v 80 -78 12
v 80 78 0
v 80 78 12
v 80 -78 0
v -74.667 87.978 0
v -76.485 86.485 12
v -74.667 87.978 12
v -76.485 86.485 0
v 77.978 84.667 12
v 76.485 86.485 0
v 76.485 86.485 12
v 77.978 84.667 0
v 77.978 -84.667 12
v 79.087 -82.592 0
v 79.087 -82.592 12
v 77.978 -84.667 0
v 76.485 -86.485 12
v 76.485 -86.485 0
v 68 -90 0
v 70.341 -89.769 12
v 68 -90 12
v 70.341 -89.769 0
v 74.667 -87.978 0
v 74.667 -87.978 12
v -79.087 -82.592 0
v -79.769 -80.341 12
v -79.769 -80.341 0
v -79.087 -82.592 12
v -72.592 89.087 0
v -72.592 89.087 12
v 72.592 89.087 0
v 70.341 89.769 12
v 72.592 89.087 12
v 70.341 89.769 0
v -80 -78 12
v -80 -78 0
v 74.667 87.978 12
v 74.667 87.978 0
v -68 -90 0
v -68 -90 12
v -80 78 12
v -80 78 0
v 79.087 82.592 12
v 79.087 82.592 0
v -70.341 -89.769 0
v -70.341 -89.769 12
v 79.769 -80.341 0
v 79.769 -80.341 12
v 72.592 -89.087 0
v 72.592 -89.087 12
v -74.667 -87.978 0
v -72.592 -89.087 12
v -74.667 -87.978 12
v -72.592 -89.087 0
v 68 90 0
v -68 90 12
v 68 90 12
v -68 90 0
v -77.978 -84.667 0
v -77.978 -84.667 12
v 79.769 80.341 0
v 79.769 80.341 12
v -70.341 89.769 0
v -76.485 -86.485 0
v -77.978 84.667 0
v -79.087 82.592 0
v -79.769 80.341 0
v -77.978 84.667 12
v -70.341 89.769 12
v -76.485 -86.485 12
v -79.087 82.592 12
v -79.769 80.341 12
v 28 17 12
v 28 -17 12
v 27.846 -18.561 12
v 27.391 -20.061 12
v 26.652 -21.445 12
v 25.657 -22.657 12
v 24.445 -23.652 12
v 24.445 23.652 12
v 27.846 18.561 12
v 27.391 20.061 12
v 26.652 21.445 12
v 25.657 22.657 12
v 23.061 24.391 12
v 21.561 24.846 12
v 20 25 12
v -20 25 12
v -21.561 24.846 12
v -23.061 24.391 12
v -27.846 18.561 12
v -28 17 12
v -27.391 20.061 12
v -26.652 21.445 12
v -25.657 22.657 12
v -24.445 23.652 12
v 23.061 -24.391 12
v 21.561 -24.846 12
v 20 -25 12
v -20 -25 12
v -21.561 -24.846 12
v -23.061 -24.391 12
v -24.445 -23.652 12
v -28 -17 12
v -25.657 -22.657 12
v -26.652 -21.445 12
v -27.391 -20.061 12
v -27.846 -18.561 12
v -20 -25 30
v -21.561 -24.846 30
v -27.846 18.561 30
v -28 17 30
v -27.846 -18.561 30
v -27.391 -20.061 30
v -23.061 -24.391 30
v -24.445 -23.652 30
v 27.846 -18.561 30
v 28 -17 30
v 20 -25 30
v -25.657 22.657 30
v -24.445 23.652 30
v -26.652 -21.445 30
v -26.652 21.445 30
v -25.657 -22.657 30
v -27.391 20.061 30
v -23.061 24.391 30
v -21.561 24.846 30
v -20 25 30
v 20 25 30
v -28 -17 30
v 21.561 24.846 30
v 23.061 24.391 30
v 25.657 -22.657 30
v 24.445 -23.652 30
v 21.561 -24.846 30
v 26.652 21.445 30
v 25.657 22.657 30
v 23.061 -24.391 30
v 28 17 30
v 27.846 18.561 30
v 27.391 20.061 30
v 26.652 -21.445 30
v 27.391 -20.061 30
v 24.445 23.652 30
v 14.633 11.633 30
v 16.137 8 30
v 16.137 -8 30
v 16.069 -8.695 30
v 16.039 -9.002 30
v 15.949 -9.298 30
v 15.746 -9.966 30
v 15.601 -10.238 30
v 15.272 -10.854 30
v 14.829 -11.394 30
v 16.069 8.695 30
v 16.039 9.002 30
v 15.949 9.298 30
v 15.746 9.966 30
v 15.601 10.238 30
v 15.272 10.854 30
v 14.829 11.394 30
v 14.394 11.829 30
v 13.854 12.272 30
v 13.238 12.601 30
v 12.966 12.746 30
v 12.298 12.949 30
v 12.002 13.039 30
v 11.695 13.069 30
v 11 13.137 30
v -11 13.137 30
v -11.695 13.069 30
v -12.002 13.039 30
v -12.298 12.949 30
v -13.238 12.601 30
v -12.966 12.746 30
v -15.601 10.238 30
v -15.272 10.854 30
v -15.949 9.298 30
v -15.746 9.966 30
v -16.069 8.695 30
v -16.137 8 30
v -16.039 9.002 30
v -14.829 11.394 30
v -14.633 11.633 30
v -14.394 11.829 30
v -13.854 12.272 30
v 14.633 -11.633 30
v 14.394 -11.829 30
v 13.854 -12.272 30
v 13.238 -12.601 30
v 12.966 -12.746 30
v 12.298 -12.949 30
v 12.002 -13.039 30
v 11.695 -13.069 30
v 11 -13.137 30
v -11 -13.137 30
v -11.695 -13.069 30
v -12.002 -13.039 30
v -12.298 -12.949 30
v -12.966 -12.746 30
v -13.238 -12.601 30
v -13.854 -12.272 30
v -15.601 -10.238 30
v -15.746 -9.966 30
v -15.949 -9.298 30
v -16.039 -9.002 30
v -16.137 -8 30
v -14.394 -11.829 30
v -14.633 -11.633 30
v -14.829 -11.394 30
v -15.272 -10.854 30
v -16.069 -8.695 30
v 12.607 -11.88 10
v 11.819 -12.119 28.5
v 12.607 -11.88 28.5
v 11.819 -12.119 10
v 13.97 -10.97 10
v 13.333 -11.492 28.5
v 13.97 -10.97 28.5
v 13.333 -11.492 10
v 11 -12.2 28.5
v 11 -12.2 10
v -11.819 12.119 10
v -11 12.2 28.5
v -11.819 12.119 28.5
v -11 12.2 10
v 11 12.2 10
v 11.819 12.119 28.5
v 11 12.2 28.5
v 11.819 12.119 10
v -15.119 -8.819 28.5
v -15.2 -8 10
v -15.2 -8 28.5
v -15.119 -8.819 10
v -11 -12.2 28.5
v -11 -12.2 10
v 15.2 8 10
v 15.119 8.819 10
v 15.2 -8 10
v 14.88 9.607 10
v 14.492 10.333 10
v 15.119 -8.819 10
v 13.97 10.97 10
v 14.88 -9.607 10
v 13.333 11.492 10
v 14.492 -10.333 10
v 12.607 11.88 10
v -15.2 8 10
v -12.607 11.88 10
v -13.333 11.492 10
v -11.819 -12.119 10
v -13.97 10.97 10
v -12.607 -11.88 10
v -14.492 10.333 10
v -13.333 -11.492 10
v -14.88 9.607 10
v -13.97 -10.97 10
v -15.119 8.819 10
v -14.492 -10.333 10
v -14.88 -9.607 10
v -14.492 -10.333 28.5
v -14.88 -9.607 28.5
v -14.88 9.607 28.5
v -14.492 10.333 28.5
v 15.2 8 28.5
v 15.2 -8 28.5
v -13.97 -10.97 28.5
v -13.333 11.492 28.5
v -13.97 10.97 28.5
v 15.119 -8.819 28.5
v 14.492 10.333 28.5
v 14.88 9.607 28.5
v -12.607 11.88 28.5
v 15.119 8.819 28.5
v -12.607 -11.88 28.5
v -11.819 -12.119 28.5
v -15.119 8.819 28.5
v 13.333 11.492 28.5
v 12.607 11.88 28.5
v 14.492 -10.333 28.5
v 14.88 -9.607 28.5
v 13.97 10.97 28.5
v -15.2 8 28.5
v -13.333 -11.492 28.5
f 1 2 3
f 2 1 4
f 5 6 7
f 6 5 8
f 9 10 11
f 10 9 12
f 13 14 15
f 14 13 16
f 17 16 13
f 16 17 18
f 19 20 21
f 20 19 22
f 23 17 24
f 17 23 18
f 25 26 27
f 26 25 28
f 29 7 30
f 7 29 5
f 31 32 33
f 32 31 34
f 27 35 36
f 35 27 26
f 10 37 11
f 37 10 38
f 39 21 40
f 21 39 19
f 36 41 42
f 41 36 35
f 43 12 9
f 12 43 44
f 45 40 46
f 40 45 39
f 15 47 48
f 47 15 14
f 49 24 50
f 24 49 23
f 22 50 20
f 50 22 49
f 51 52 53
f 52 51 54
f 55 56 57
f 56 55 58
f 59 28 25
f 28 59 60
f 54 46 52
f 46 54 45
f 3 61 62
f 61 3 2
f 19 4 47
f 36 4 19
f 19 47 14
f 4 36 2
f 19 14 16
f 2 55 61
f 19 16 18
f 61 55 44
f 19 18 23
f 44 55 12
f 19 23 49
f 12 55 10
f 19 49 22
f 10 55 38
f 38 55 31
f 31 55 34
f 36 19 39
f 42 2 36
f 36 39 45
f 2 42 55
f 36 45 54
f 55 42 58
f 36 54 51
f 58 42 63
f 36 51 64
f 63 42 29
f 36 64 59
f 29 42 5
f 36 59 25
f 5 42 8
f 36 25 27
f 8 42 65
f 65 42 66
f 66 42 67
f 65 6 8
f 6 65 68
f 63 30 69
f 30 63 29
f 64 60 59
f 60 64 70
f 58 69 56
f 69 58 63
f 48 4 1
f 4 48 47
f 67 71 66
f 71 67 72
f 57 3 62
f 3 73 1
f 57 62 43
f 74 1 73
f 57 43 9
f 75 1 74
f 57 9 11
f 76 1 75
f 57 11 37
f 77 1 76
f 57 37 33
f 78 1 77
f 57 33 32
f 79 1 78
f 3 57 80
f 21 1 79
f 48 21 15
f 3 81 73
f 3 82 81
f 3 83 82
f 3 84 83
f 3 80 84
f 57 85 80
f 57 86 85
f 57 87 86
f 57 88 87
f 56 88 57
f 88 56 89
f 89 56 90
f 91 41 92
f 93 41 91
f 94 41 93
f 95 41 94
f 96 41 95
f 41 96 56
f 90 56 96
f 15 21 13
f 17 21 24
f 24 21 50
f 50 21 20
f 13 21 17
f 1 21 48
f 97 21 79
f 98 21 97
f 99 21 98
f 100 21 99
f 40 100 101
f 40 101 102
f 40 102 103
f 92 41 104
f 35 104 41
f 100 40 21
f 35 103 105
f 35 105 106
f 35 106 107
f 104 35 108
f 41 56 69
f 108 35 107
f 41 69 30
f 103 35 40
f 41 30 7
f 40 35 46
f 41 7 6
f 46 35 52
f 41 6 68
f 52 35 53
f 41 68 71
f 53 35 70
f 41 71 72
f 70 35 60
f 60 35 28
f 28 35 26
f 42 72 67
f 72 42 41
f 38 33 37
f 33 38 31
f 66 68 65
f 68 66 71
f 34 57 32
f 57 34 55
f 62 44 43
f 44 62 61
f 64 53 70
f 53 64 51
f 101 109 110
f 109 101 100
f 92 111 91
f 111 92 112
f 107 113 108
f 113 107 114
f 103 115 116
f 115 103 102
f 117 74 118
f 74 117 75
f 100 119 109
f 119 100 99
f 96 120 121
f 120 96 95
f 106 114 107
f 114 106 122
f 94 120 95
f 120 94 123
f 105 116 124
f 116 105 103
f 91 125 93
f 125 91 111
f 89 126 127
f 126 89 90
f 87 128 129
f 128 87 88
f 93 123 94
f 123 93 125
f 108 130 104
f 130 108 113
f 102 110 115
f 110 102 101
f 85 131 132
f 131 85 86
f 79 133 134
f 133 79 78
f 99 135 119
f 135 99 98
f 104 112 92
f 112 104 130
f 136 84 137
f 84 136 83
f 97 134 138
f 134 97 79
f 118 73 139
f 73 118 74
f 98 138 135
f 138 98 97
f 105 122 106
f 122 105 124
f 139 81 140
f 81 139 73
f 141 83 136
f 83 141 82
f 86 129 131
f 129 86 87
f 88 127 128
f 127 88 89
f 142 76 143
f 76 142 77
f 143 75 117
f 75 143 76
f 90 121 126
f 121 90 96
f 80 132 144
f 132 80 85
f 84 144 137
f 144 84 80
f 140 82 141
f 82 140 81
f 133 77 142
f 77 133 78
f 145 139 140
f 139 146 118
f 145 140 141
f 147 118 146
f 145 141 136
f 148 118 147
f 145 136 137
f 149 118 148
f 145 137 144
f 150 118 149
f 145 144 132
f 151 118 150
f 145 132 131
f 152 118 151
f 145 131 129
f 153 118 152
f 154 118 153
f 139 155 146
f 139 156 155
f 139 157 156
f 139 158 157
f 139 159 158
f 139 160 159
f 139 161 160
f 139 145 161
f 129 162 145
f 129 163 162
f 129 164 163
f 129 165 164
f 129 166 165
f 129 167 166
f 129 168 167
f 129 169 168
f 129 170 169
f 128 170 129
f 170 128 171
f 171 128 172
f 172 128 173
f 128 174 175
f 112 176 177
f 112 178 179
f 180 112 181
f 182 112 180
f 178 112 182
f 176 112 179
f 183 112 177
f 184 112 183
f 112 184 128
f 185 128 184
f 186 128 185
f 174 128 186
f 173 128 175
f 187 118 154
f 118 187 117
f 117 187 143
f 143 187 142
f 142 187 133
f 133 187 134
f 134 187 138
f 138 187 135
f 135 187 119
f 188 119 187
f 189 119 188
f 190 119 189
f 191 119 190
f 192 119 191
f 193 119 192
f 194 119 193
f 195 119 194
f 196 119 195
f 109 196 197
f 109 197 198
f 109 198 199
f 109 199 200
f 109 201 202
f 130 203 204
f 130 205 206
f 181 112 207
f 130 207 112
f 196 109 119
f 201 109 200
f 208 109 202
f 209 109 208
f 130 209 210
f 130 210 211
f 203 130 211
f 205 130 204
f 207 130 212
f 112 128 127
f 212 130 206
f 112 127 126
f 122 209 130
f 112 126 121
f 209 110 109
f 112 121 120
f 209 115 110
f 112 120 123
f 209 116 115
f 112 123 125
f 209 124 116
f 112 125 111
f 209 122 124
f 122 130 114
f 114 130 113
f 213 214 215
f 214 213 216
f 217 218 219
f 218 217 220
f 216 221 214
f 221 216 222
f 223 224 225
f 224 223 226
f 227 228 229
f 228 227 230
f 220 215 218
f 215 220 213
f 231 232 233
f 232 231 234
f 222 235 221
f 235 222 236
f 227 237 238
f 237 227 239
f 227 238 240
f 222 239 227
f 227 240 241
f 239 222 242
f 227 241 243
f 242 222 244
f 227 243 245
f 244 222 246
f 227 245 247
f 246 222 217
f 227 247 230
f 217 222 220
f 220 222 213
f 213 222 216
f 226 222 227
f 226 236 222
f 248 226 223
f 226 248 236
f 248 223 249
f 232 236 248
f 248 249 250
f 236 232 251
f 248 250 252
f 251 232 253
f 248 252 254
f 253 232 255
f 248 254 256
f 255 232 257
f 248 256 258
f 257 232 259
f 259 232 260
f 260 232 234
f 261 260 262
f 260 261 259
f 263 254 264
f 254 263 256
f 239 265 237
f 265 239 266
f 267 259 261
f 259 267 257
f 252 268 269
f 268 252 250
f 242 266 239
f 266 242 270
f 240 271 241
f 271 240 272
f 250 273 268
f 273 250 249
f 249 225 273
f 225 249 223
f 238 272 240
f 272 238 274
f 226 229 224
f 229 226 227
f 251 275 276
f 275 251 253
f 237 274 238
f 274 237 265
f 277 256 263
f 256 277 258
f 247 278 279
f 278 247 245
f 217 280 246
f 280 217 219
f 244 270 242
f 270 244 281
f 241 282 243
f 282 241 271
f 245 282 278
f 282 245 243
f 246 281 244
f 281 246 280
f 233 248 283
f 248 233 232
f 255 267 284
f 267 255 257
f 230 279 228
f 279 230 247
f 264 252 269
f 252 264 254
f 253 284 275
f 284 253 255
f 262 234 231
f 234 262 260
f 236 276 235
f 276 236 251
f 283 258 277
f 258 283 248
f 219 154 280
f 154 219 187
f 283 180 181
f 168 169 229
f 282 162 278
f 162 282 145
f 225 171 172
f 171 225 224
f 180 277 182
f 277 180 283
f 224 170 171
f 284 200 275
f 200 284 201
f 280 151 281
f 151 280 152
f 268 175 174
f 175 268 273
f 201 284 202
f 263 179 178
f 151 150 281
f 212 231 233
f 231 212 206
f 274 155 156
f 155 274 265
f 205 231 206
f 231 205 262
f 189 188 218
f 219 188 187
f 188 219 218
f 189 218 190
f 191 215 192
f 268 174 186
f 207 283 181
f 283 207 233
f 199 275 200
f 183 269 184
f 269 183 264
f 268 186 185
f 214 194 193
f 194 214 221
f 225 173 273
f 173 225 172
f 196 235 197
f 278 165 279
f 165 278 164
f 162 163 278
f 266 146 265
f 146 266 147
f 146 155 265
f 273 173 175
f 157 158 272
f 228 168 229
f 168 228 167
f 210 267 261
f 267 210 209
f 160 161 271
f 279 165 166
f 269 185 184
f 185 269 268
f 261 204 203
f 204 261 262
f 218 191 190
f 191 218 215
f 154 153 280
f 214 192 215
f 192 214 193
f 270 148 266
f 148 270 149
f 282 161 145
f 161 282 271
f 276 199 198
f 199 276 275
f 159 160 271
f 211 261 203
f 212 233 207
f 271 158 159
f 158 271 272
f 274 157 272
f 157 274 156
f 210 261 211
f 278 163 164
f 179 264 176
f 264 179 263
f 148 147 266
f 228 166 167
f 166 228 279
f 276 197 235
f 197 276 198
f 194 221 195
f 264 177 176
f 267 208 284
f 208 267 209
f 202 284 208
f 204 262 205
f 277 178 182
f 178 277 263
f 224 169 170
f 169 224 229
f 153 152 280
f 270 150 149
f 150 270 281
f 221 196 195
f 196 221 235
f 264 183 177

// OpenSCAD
// Headphone stand in three parts - PLA, no supports, 0.4mm nozzle
// Print orientations (+Z up, bottom on bed):
//   base   : flat, plate bottom on bed
//   post   : vertical, bottom on bed (250+ tall)
//   hanger : flat bottom on bed, curved top up, socket opening down (bridged)
// Assembly (desk Z=0): base 0-30, post 10-262, hanger 244-270 (top ~270)

part = "base"; // [base:Base, post:Post, hanger:Hanger, assembly:Assembly]
cadverify_only = "";
module instance(name, part, unit = 1) {
    echo(cadverify_instance = [name, part, unit]);
    if (cadverify_only == "" || cadverify_only == name) children();
}

// ---------- parameters ----------
baseW = 160; baseD = 180; baseT = 12; baseR = 12;
bossW = 56; bossD = 50; bossH = 18; bossR = 8;
bossTop = baseT + bossH; // 30
sockW = 30.4; sockD = 24.4; sockR = 4.2; // base socket (post 30x24 +0.4)
sockDepthBase = 20;
sockFloorBase = bossTop - sockDepthBase; // 10
flare = 1.5;
mouthWBase = sockW + 2*flare; mouthDBase = sockD + 2*flare; mouthRBase = sockR + flare;

postW = 30; postD = 24; postR = 4; postH = 252; postCham = 1.5;
tipW = postW - 2*postCham; tipD = postD - 2*postCham; tipR = 2.5;

hangW = 42; hangL = 120; hangZc = 26; hangZe = 14; hangFillet = 8; hangPlanR = 15;
hangSockW = 30.4; hangSockD = 24.4; hangSockR = 4.2; hangSockDepth = 18;
mouthWH = hangSockW + 2*flare; mouthDH = hangSockD + 2*flare; mouthRH = hangSockR + flare;

postZ = 10;          // post bottom in assembly
hangerZ = 244;       // hanger bottom in assembly -> top 270
// post top = postZ+postH = 262 = hangerZ+hangSockDepth (socket floor)

// ---------- helpers ----------
module rounded_box(W,D,H,R) {
    // centered in XY, bottom at Z=0
    if (R <= 0.01) {
        translate([-W/2,-D/2,0]) cube([W,D,H]);
    } else {
        hull() {
            for (sx=[-1,1], sy=[-1,1])
                translate([sx*(W/2-R), sy*(D/2-R), 0])
                    cylinder(r=R, h=H, $fn=32);
        }
    }
}
module rect_frustum(W1,D1,R1, W2,D2,R2, H) {
    // bottom size 1 at Z=0, top size 2 at Z=H
    hull() {
        translate([0,0,0]) rounded_box(W1,D1,0.1,R1);
        translate([0,0,H-0.1]) rounded_box(W2,D2,0.1,R2);
    }
}

// ---------- parts (print orientation, bottom Z=0, centered XY) ----------
module base_part() {
    difference() {
        union() {
            rounded_box(baseW, baseD, baseT, baseR);
            translate([0,0,baseT-0.2]) rounded_box(bossW, bossD, bossH+0.2, bossR);
        }
        // socket bore (extend above mouth for clean cut)
        translate([0,0,sockFloorBase]) rounded_box(sockW, sockD, sockDepthBase+1.0, sockR);
        // entry flare 45deg (mouth larger at top)
        translate([0,0,bossTop-flare])
            rect_frustum(sockW,sockD,sockR, mouthWBase,mouthDBase,mouthRBase, flare+1.0);
    }
}

module post_part() {
    union() {
        // middle shaft (overlap frustums)
        translate([0,0,postCham-0.2]) rounded_box(postW, postD, postH-2*postCham+0.4, postR);
        // bottom lead-in (small face on bed)
        translate([0,0,0]) rect_frustum(tipW,tipD,tipR, postW,postD,postR, postCham+0.2);
        // top lead-in
        translate([0,0,postH-postCham-0.2]) rect_frustum(postW,postD,postR, tipW,tipD,tipR, postCham+0.2);
    }
}

module hanger_solid() {
    // A: transverse profile (filleted top) extruded along Y
    // B: longitudinal arch (parabolic top) extruded along X
    // D: plan rounded rect prism; result = A n B n D
    intersection() {
        // A
        union() {
            translate([0,0,0]) cube([hangW, hangL, hangZc-hangFillet], center=true);
            // recentre: cube center=true gives Z centred; shift up
            // => redo with bottom at 0:
        }
        // placeholder (replaced below)
        cube([1,1,1]);
    }
}
// build A/B/D explicitly (no placeholder)
module hanger_A() {
    union() {
        // lower block 0 .. Zc-r
        translate([-hangW/2, -hangL/2, 0]) cube([hangW, hangL, hangZc-hangFillet]);
        // upper block (narrower) r .. top
        translate([-(hangW-2*hangFillet)/2, -hangL/2, hangZc-hangFillet])
            cube([hangW-2*hangFillet, hangL, hangFillet]);
        // two side fillet cylinders along Y
        for (sx=[-1,1])
            translate([sx*(hangW/2-hangFillet), -hangL/2, hangZc-hangFillet])
                rotate([90,0,0]) translate([0,0,0]) { }
        for (sx=[-1,1])
            translate([sx*(hangW/2-hangFillet), -hangL/2, hangZc-hangFillet])
                rotate([-90,0,0])
                    cylinder(r=hangFillet, h=hangL, $fn=32);
    }
}
module hanger_B() {
    // hull of slices under parabolic top (convex hypograph)
    N = 25;
    hull() {
        for (i=[0:N-1]) {
            yi = -hangL/2 + hangL*i/(N-1);
            hi = hangZc - (hangZc-hangZe)*pow(2*yi/hangL,2);
            translate([-hangW/2, yi-0.3, 0]) cube([hangW, 0.6, hi]);
        }
    }
}
module hanger_D() {
    rounded_box(hangW, hangL, 30, hangPlanR);
}
module hanger_part() {
    difference() {
        intersection() {
            hanger_A();
            hanger_B();
            hanger_D();
        }
        // socket bore (extend below bed for clean cut)
        translate([0,0,-0.5]) rounded_box(hangSockW, hangSockD, hangSockDepth+0.5, hangSockR);
        // entry flare at mouth (bottom)
        translate([0,0,-0.5])
            rect_frustum(mouthWH,mouthDH,mouthRH, hangSockW,hangSockD,hangSockR, flare+0.5);
    }
}

// ---------- specs ----------
if (part == "base") {
    echo(cadverify_spec = [
        ["bounds", [[-baseW/2, -baseD/2, 0], [baseW/2, baseD/2, bossTop]]],
        ["bodies", 1],
        ["through_holes", 0],
        ["support_faces", [["bed", "-z", 20000]]],
        ["overhangs_allowed", []],
        ["copies", 1],
        ["details", [
            ["plate", "material", [[-baseW/2, -baseD/2, 0], [baseW/2, baseD/2, baseT]], 0.95],
            ["boss", "material", [[-bossW/2, -bossD/2, baseT], [bossW/2, bossD/2, bossTop]], 0.60],
            ["socket", "void", [[-sockW/2, -sockD/2, sockFloorBase], [sockW/2, sockD/2, bossTop]], 0.90],
            ["floor", "thickness", [0, 0, -5], [0, 0, 1], 10],
            ["corner", "view", [[65, 75, 0], [80, 90, 12]]],
            ["mouth", "view", [[-17, -14, 28], [17, 14, 30]]]
        ]]
    ]);
    base_part();
} else if (part == "post") {
    echo(cadverify_spec = [
        ["bounds", [[-postW/2, -postD/2, 0], [postW/2, postD/2, postH]]],
        ["bodies", 1],
        ["through_holes", 0],
        ["support_faces", [["bed", "-z", 400]]],
        ["overhangs_allowed", []],
        ["copies", 1],
        ["details", [
            ["shaft", "material", [[-9.5, -9.5, 10], [9.5, 9.5, 242]], 0.99],
            ["wall", "thickness", [30, 0, 126], [-1, 0, 0], 28],
            ["lead", "view", [[-15, -12, 0], [15, 12, 3]]],
            ["topcham", "view", [[-15, -12, 249], [15, 12, 252]]]
        ]]
    ]);
    post_part();
} else if (part == "hanger") {
    echo(cadverify_spec = [
        ["bounds", [[-hangW/2, -hangL/2, 0], [hangW/2, hangL/2, hangZc]]],
        ["bodies", 1],
        ["through_holes", 0],
        ["support_faces", [["bed", "-z", 2500]]],
        ["overhangs_allowed", [["bridging socket ceiling", [[-hangSockW/2, -hangSockD/2, 16], [hangSockW/2, hangSockD/2, 20]]]]],
        ["copies", 1],
        ["details", [
            ["contact", "material", [[-15, -30, 18], [15, 30, 22]], 0.95],
            ["socket", "void", [[-hangSockW/2, -hangSockD/2, 0], [hangSockW/2, hangSockD/2, hangSockDepth]], 0.90],
            ["topwall", "thickness", [0, 0, 30], [0, 0, -1], 8],
            ["fillet", "view", [[13, -20, 18], [21, 20, 26]]],
            ["arch", "view", [[-21, -60, 12], [21, -40, 16]]],
            ["mouth", "view", [[-17, -14, 0], [17, 14, 2]]]
        ]]
    ]);
    hanger_part();
} else if (part == "assembly") {
    echo(cadverify_spec = [
        ["bounds", [[-baseW/2, -baseD/2, 0], [baseW/2, baseD/2, hangerZ+hangZc]]],
        ["support_faces", [["desk", "-z", 20000]]],
        ["allowed_interferences", []],
        ["motions", []],
        ["assembly_order", [
            [["base_1"], [0, 0, 0]],
            [["post_1"], [0, 0, 1]],
            [["hanger_1"], [0, 0, 1]]
        ]]
    ]);
    instance("base_1", "base") translate([0,0,0]) base_part();
    instance("post_1", "post") translate([0,0,postZ]) post_part();
    instance("hanger_1", "hanger") translate([0,0,hangerZ]) hanger_part();
}
